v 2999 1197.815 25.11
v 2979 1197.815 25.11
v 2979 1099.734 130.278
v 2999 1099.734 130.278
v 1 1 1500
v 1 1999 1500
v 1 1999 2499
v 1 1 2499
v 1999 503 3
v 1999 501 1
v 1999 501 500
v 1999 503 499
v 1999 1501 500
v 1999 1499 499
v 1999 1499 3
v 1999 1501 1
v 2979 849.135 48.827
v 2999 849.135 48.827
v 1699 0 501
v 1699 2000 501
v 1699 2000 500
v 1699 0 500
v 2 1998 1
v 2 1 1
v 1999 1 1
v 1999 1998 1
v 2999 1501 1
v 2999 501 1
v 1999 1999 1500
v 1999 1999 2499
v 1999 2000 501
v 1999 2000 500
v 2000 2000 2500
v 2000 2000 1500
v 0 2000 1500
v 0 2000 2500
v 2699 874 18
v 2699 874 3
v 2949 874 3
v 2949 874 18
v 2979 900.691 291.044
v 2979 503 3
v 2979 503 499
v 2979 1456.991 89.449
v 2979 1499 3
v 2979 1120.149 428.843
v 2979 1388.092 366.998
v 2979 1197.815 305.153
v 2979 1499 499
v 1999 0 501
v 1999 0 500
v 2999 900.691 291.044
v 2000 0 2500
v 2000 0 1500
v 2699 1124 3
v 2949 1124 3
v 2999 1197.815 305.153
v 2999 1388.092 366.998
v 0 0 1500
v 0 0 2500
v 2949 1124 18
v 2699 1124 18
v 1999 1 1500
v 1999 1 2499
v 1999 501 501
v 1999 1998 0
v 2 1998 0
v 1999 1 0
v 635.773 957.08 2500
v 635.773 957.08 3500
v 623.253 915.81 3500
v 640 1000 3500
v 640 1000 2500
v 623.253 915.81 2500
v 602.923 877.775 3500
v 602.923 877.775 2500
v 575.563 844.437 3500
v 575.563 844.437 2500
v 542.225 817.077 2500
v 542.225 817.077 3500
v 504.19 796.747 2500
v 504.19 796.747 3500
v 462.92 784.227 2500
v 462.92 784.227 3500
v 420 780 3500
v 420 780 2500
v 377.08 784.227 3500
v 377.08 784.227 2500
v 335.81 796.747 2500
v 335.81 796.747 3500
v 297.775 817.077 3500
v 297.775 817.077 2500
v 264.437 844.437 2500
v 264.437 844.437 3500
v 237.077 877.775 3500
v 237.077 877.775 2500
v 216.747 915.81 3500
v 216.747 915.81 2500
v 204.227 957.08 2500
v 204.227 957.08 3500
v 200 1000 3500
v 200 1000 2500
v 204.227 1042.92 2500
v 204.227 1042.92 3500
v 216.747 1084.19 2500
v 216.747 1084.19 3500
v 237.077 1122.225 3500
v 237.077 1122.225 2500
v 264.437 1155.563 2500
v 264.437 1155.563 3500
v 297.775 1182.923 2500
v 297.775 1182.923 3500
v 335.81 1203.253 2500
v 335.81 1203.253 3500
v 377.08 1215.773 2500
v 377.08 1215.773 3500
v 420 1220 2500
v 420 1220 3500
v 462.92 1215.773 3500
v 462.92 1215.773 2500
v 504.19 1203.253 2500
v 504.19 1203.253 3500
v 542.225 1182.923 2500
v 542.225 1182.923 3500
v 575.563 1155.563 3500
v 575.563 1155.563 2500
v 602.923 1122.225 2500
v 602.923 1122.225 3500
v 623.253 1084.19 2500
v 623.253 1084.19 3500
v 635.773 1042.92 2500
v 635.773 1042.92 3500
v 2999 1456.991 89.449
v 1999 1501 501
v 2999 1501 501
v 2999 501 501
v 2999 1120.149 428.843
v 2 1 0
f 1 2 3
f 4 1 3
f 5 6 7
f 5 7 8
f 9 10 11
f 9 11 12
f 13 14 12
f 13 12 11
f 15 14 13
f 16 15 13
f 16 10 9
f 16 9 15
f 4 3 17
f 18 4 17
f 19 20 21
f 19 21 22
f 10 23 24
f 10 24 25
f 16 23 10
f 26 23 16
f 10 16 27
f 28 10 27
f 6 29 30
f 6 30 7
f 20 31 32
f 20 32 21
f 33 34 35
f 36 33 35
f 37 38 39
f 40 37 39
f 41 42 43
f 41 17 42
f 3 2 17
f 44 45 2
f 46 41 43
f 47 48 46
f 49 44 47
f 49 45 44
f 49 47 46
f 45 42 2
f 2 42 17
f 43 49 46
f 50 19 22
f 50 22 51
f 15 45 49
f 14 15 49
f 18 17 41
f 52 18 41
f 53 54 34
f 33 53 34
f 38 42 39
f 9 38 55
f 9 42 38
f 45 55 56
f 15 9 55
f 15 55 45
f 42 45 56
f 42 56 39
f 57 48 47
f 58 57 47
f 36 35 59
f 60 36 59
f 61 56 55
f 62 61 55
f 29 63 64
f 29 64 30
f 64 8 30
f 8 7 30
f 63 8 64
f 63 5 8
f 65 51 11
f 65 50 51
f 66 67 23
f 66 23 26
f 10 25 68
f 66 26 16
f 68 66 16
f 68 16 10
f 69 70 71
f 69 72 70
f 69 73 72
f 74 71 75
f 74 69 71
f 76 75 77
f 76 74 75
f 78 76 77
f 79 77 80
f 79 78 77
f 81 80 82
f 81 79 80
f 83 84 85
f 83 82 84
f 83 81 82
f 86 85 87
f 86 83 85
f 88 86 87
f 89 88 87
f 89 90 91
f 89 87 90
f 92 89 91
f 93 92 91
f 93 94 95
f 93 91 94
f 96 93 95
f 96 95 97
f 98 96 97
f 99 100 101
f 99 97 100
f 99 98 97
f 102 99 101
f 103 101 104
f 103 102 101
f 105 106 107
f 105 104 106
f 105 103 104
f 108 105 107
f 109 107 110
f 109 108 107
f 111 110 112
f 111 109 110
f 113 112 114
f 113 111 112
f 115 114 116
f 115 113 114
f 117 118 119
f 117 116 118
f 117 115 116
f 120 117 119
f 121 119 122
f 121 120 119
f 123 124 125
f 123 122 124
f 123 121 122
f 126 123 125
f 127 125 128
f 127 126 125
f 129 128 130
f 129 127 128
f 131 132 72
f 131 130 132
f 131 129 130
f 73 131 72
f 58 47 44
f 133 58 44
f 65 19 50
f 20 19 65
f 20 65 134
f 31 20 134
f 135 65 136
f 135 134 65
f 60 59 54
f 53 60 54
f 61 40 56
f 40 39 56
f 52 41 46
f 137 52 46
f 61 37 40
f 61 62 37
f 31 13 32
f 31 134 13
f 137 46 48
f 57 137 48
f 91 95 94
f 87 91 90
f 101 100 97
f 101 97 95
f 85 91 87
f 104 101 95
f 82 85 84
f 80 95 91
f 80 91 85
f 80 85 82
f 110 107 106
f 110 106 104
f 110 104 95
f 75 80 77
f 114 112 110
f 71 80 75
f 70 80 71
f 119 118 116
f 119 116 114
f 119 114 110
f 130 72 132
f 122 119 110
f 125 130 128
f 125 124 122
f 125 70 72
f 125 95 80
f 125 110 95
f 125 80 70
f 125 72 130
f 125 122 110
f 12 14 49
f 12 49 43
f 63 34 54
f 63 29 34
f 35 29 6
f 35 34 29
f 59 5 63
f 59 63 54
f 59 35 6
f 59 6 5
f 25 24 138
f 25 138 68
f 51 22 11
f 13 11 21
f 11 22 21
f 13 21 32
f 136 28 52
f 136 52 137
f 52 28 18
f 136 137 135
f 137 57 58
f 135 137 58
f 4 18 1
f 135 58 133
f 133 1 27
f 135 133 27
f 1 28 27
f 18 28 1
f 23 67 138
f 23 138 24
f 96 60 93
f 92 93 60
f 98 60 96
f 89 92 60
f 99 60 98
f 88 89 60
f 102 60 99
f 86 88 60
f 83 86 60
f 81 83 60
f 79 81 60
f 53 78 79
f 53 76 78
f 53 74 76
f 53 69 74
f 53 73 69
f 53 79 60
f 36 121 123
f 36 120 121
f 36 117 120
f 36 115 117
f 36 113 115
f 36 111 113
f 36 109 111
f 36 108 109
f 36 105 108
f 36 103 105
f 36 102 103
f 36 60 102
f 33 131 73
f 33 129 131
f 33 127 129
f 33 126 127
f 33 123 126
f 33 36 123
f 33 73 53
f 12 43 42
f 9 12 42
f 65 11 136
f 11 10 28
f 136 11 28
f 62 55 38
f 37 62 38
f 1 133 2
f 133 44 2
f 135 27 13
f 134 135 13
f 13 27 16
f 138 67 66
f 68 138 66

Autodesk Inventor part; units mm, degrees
ref_plane "YZ Plane" through (0, 0, 0) normal (1, 0, 0) x (0, 1, 0)
ref_plane "XZ Plane" through (0, 0, 0) normal (0, 1, 0) x (-1, 0, 0)
ref_plane "XY Plane" through (0, 0, 0) normal (0, 0, 1) x (1, 0, 0)
sketch "Sketch1" plane through (0, 0, 0) normal (0, 0, 1) x (1, 0, 0)
  line L0 (0, 0) -> (2000, 0)
  line L1 (2000, 0) -> (2000, 2000)
  line L2 (2000, 2000) -> (0, 2000)
  line L3 (0, 2000) -> (0, 0)
  dimension "d0" = 2000
  dimension "d2" = 2000
extrude "Extrusion1" add sketch "Sketch1" along normal blind 2500
shell "Shell1" thickness 1 removed faces 0
sketch "Sketch2" plane through (0, 0, 0) normal (0, -1, 0) x (1, 0, 0)
  line L0 (0, 0) -> (2000, 0) projected
  line L1 (2000, 0) -> (2000, 2500) projected
  line L2 (0, 0) -> (2000, 0)
  line L3 (2000, 0) -> (2000, 1500)
  line L4 (2000, 1500) -> (0, 1500)
  line L5 (0, 1500) -> (0, 0)
  dimension "d6" = 1500
extrude "Extrusion2" cut sketch "Sketch2" along normal mid plane 2
sketch "Sketch3" plane through (2000, 0, 2500) normal (1, 0, 0) x (0, 0, -1)
  line L0 (2500, 2000) -> (0, 2000) projected
  line L1 (2500, 0) -> (1000, 0)
  line L2 (1000, 0) -> (1000, 2000)
  line L3 (1000, 2000) -> (2500, 2000)
  line L4 (2500, 2000) -> (2500, 0)
  dimension "d10" = 1500
extrude "Extrusion3" cut sketch "Sketch3" along normal mid plane 2
sketch "Sketch4" plane through (0, 2000, 2500) normal (0, 1, 0) x (1, 0, 0)
  line L0 (0, 2500) -> (0, 0) projected
  line L1 (1999, 2500) -> (0, 2500)
  line L2 (0, 2500) -> (0, 1000)
  line L3 (0, 1000) -> (1999, 1000)
  line L4 (1999, 1000) -> (1999, 2500)
  dimension "d14" = 1500
extrude "Extrusion4" cut sketch "Sketch4" against normal blind 2
sketch "Sketch5" plane through (0, 0, 2500) normal (-1, 0, 0) x (0, 0, 1)
  line L0 (-1000, 0) -> (0, 0) projected
  line L1 (-2500, 1998) -> (-1000, 1998)
  line L2 (-1000, 1998) -> (-1000, 0)
  line L3 (-1000, 0) -> (-2500, 0)
  line L4 (-2500, 0) -> (-2500, 1998)
  point P0 (-2500, 0)
  dimension "d18" = 1500
extrude "Extrusion5" cut sketch "Sketch5" against normal blind 2
sketch "Sketch8" plane through (1999, 1, 1) normal (0, 0, 1) x (1, 0, 0)
  line L0 (-1997, 0) -> (0, 0) projected
  line L1 (0, 0) -> (0, 1997) projected
  line L2 (0, 500) -> (1000, 500)
  line L3 (1000, 500) -> (1000, 1500)
  line L4 (1000, 1500) -> (0, 1500)
  line L5 (0, 1500) -> (0, 500)
  point P0 (-1999, -1)
  dimension "d30" = 500
  dimension "d31" = 1000
  dimension "d65" = 1000
extrude "Extrusion8" add sketch "Sketch8" along normal blind 500
sketch "Sketch9" plane through (1999, 1, 501) normal (0, 0, 1) x (1, 0, 0)
  line L0 (-300, -1) -> (0, -1)
  line L1 (0, -1) -> (0, 1999)
  line L2 (0, 1999) -> (-300, 1999)
  line L3 (-300, 1999) -> (-300, -1)
  point P0 (-1999, -1)
  dimension "d34" = 2000
  dimension "d36" = 300
extrude "Extrusion9" add sketch "Sketch9" against normal blind 1
sketch "Sketch10" plane through (0, 0, 2500) normal (0, 0, 1) x (1, 0, 0)
  line L0 (0, 0) -> (2000, 0) projected
  line L1 (0, 2000) -> (0, 0) projected
  circle A0 centre (420, 1000) radius 220
  dimension "d39" = 440
  dimension "d41" = 420
  dimension "d42" = 1000
extrude "Extrusion10" add sketch "Sketch10" along normal blind 1000
sketch "Sketch12" plane through (1999, 501, 1) normal (-1, 0, 0) x (0, 0, 1)
  line L0 (0, 0) -> (0, 1000) projected
  line L1 (0, 0) -> (499, 0) projected
  line L2 (2, 998) -> (498, 998)
  line L3 (498, 998) -> (498, 2)
  line L4 (498, 2) -> (2, 2)
  line L5 (2, 2) -> (2, 998)
  point P0 (-1, -501)
  dimension "d51" = 496
  dimension "d53" = 2
  dimension "d54" = 996
  dimension "d55" = 2
extrude "Extrusion12" cut sketch "Sketch12" against normal blind 980
sketch "Sketch15" plane through (1999, 503, 3) normal (0, 0, 1) x (1, 0, 0)
  line L0 (0, 996) -> (980, 996) projected
  line L1 (700, 371) -> (950, 371)
  line L2 (950, 371) -> (950, 621)
  line L3 (950, 621) -> (700, 621)
  line L4 (700, 621) -> (700, 371)
  line L5 (1000, -2) -> (1000, 998) projected
  point P0 (-1999, -503)
  dimension "d58" = 250
  dimension "d60" = 250
  dimension "d61" = 375
  dimension "d68" = 50
extrude "Extrusion13" add sketch "Sketch15" along normal blind 15
sketch "Sketch17" plane through (2999, 501, 1) normal (1, 0, 0) x (0, 0, -1)
  line L0 (-290.0438, 399.6914) -> (-427.8429, 619.1492)
  line L1 (-427.8429, 619.1492) -> (-304.1531, 696.8149)
  line L2 (-304.1531, 696.8149) -> (-365.998, 887.0919)
  line L3 (-365.998, 887.0919) -> (-88.4488, 955.9914)
  line L4 (-88.4488, 955.9914) -> (-24.1101, 696.8149)
  line L5 (-24.1101, 696.8149) -> (-129.2782, 598.7345)
  line L6 (-129.2782, 598.7345) -> (-47.8269, 348.1347)
  line L7 (-47.8269, 348.1347) -> (-290.0438, 399.6914)
  point P0 (1, -501)
extrude "Extrusion15" cut sketch "Sketch17" along normal mid plane 100
properties part number "Harrison_Spill_Plumes"
